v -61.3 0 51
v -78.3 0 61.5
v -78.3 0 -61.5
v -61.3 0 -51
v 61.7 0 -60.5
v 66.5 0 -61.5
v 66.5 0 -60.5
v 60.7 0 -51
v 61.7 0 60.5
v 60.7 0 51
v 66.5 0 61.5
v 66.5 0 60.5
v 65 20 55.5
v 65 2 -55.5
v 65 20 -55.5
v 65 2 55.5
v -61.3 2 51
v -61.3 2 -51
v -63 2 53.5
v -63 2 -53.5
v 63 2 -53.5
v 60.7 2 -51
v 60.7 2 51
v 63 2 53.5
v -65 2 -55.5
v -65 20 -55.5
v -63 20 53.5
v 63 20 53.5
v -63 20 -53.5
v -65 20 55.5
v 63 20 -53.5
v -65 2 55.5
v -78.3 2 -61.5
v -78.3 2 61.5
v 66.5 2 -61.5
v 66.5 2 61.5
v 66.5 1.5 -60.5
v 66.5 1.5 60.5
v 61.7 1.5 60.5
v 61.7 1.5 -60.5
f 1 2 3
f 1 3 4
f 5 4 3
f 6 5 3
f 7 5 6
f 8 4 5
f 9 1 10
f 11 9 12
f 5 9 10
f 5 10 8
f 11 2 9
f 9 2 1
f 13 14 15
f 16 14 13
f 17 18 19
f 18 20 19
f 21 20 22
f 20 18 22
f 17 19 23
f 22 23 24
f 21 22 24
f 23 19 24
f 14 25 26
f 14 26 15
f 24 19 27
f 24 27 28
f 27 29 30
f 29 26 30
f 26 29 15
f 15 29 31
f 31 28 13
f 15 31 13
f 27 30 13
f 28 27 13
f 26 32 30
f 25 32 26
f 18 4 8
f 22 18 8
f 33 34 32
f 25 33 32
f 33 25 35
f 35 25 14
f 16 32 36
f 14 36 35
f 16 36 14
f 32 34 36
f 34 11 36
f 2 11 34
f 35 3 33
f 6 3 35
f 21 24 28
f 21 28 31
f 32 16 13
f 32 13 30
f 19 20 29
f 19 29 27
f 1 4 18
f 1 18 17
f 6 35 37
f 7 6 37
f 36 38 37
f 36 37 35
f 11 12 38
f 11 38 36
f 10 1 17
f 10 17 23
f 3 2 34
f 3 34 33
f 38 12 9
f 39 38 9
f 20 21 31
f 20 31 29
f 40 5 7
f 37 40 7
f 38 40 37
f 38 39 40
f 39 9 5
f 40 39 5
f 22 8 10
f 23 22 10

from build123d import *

# Parameters (mm, degrees)
F0_W          = 124.7
F0_H          = 107
F0_W_2        = 122
F0_H_2        = 102
F0_W_3        = 1.3
F1_DEPTH      = 2
F2_DEPTH      = 20
F3_DEPTH      = 1.5
F3_DEPTH_BACK = 2


with BuildPart() as f1:
    # F0 (on Front) → F1 (new body)
    with BuildSketch(Plane.XZ):
        Polygon((-78.3, -61.5), (66.5, -61.5), (66.5, -60.5), (61.7, -60.5), (61.7, -55.5), (-65, -55.5), (-65, 55.5), (61.7, 55.5), (61.7, 60.5), (66.5, 60.5), (66.5, 61.5), (-78.3, 61.5), align=None)
        Polygon((61.7, -53.5), (61.7, -55.5), (65, -55.5), (65, 55.5), (61.7, 55.5), (61.7, 53.5), (63, 53.5), (63, -53.5), align=None)
        Polygon((-65, -55.5), (61.7, -55.5), (61.7, -53.5), (-63, -53.5), (-63, 53.5), (61.7, 53.5), (61.7, 55.5), (-65, 55.5), align=None)
        with Locations((-0.65, 0)):
            Rectangle(F0_W, F0_H)
        with Locations((-0.3, 0)):
            Rectangle(F0_W_2, F0_H_2, mode=Mode.SUBTRACT)
        Polygon((61.7, -60.5), (66.5, -60.5), (66.5, 60.5), (61.7, 60.5), (61.7, 55.5), (65, 55.5), (65, -55.5), (61.7, -55.5), align=None)
        with Locations((62.35, 0)):
            Rectangle(F0_W_3, F0_H)
    extrude(amount=-F1_DEPTH)

    # F0 (on Front) → F2 (join)
    with BuildSketch(Plane.XZ):
        Polygon((61.7, -53.5), (61.7, -55.5), (65, -55.5), (65, 55.5), (61.7, 55.5), (61.7, 53.5), (63, 53.5), (63, -53.5), align=None)
        Polygon((-65, -55.5), (61.7, -55.5), (61.7, -53.5), (-63, -53.5), (-63, 53.5), (61.7, 53.5), (61.7, 55.5), (-65, 55.5), align=None)
    extrude(amount=-F2_DEPTH)

    # F0 (on Front) → F3 (cut, two sides)
    with BuildSketch(Plane.XZ) as f3_sk:
        Polygon((61.7, -60.5), (66.5, -60.5), (66.5, 60.5), (61.7, 60.5), (61.7, 55.5), (65, 55.5), (65, -55.5), (61.7, -55.5), align=None)
        with Locations((62.35, 0)):
            Rectangle(F0_W_3, F0_H)
        Polygon((61.7, -53.5), (61.7, -55.5), (65, -55.5), (65, 55.5), (61.7, 55.5), (61.7, 53.5), (63, 53.5), (63, -53.5), align=None)
    extrude(amount=-F3_DEPTH, mode=Mode.SUBTRACT)
    extrude(f3_sk.sketch, amount=F3_DEPTH_BACK, mode=Mode.SUBTRACT)


solid = f1.part
